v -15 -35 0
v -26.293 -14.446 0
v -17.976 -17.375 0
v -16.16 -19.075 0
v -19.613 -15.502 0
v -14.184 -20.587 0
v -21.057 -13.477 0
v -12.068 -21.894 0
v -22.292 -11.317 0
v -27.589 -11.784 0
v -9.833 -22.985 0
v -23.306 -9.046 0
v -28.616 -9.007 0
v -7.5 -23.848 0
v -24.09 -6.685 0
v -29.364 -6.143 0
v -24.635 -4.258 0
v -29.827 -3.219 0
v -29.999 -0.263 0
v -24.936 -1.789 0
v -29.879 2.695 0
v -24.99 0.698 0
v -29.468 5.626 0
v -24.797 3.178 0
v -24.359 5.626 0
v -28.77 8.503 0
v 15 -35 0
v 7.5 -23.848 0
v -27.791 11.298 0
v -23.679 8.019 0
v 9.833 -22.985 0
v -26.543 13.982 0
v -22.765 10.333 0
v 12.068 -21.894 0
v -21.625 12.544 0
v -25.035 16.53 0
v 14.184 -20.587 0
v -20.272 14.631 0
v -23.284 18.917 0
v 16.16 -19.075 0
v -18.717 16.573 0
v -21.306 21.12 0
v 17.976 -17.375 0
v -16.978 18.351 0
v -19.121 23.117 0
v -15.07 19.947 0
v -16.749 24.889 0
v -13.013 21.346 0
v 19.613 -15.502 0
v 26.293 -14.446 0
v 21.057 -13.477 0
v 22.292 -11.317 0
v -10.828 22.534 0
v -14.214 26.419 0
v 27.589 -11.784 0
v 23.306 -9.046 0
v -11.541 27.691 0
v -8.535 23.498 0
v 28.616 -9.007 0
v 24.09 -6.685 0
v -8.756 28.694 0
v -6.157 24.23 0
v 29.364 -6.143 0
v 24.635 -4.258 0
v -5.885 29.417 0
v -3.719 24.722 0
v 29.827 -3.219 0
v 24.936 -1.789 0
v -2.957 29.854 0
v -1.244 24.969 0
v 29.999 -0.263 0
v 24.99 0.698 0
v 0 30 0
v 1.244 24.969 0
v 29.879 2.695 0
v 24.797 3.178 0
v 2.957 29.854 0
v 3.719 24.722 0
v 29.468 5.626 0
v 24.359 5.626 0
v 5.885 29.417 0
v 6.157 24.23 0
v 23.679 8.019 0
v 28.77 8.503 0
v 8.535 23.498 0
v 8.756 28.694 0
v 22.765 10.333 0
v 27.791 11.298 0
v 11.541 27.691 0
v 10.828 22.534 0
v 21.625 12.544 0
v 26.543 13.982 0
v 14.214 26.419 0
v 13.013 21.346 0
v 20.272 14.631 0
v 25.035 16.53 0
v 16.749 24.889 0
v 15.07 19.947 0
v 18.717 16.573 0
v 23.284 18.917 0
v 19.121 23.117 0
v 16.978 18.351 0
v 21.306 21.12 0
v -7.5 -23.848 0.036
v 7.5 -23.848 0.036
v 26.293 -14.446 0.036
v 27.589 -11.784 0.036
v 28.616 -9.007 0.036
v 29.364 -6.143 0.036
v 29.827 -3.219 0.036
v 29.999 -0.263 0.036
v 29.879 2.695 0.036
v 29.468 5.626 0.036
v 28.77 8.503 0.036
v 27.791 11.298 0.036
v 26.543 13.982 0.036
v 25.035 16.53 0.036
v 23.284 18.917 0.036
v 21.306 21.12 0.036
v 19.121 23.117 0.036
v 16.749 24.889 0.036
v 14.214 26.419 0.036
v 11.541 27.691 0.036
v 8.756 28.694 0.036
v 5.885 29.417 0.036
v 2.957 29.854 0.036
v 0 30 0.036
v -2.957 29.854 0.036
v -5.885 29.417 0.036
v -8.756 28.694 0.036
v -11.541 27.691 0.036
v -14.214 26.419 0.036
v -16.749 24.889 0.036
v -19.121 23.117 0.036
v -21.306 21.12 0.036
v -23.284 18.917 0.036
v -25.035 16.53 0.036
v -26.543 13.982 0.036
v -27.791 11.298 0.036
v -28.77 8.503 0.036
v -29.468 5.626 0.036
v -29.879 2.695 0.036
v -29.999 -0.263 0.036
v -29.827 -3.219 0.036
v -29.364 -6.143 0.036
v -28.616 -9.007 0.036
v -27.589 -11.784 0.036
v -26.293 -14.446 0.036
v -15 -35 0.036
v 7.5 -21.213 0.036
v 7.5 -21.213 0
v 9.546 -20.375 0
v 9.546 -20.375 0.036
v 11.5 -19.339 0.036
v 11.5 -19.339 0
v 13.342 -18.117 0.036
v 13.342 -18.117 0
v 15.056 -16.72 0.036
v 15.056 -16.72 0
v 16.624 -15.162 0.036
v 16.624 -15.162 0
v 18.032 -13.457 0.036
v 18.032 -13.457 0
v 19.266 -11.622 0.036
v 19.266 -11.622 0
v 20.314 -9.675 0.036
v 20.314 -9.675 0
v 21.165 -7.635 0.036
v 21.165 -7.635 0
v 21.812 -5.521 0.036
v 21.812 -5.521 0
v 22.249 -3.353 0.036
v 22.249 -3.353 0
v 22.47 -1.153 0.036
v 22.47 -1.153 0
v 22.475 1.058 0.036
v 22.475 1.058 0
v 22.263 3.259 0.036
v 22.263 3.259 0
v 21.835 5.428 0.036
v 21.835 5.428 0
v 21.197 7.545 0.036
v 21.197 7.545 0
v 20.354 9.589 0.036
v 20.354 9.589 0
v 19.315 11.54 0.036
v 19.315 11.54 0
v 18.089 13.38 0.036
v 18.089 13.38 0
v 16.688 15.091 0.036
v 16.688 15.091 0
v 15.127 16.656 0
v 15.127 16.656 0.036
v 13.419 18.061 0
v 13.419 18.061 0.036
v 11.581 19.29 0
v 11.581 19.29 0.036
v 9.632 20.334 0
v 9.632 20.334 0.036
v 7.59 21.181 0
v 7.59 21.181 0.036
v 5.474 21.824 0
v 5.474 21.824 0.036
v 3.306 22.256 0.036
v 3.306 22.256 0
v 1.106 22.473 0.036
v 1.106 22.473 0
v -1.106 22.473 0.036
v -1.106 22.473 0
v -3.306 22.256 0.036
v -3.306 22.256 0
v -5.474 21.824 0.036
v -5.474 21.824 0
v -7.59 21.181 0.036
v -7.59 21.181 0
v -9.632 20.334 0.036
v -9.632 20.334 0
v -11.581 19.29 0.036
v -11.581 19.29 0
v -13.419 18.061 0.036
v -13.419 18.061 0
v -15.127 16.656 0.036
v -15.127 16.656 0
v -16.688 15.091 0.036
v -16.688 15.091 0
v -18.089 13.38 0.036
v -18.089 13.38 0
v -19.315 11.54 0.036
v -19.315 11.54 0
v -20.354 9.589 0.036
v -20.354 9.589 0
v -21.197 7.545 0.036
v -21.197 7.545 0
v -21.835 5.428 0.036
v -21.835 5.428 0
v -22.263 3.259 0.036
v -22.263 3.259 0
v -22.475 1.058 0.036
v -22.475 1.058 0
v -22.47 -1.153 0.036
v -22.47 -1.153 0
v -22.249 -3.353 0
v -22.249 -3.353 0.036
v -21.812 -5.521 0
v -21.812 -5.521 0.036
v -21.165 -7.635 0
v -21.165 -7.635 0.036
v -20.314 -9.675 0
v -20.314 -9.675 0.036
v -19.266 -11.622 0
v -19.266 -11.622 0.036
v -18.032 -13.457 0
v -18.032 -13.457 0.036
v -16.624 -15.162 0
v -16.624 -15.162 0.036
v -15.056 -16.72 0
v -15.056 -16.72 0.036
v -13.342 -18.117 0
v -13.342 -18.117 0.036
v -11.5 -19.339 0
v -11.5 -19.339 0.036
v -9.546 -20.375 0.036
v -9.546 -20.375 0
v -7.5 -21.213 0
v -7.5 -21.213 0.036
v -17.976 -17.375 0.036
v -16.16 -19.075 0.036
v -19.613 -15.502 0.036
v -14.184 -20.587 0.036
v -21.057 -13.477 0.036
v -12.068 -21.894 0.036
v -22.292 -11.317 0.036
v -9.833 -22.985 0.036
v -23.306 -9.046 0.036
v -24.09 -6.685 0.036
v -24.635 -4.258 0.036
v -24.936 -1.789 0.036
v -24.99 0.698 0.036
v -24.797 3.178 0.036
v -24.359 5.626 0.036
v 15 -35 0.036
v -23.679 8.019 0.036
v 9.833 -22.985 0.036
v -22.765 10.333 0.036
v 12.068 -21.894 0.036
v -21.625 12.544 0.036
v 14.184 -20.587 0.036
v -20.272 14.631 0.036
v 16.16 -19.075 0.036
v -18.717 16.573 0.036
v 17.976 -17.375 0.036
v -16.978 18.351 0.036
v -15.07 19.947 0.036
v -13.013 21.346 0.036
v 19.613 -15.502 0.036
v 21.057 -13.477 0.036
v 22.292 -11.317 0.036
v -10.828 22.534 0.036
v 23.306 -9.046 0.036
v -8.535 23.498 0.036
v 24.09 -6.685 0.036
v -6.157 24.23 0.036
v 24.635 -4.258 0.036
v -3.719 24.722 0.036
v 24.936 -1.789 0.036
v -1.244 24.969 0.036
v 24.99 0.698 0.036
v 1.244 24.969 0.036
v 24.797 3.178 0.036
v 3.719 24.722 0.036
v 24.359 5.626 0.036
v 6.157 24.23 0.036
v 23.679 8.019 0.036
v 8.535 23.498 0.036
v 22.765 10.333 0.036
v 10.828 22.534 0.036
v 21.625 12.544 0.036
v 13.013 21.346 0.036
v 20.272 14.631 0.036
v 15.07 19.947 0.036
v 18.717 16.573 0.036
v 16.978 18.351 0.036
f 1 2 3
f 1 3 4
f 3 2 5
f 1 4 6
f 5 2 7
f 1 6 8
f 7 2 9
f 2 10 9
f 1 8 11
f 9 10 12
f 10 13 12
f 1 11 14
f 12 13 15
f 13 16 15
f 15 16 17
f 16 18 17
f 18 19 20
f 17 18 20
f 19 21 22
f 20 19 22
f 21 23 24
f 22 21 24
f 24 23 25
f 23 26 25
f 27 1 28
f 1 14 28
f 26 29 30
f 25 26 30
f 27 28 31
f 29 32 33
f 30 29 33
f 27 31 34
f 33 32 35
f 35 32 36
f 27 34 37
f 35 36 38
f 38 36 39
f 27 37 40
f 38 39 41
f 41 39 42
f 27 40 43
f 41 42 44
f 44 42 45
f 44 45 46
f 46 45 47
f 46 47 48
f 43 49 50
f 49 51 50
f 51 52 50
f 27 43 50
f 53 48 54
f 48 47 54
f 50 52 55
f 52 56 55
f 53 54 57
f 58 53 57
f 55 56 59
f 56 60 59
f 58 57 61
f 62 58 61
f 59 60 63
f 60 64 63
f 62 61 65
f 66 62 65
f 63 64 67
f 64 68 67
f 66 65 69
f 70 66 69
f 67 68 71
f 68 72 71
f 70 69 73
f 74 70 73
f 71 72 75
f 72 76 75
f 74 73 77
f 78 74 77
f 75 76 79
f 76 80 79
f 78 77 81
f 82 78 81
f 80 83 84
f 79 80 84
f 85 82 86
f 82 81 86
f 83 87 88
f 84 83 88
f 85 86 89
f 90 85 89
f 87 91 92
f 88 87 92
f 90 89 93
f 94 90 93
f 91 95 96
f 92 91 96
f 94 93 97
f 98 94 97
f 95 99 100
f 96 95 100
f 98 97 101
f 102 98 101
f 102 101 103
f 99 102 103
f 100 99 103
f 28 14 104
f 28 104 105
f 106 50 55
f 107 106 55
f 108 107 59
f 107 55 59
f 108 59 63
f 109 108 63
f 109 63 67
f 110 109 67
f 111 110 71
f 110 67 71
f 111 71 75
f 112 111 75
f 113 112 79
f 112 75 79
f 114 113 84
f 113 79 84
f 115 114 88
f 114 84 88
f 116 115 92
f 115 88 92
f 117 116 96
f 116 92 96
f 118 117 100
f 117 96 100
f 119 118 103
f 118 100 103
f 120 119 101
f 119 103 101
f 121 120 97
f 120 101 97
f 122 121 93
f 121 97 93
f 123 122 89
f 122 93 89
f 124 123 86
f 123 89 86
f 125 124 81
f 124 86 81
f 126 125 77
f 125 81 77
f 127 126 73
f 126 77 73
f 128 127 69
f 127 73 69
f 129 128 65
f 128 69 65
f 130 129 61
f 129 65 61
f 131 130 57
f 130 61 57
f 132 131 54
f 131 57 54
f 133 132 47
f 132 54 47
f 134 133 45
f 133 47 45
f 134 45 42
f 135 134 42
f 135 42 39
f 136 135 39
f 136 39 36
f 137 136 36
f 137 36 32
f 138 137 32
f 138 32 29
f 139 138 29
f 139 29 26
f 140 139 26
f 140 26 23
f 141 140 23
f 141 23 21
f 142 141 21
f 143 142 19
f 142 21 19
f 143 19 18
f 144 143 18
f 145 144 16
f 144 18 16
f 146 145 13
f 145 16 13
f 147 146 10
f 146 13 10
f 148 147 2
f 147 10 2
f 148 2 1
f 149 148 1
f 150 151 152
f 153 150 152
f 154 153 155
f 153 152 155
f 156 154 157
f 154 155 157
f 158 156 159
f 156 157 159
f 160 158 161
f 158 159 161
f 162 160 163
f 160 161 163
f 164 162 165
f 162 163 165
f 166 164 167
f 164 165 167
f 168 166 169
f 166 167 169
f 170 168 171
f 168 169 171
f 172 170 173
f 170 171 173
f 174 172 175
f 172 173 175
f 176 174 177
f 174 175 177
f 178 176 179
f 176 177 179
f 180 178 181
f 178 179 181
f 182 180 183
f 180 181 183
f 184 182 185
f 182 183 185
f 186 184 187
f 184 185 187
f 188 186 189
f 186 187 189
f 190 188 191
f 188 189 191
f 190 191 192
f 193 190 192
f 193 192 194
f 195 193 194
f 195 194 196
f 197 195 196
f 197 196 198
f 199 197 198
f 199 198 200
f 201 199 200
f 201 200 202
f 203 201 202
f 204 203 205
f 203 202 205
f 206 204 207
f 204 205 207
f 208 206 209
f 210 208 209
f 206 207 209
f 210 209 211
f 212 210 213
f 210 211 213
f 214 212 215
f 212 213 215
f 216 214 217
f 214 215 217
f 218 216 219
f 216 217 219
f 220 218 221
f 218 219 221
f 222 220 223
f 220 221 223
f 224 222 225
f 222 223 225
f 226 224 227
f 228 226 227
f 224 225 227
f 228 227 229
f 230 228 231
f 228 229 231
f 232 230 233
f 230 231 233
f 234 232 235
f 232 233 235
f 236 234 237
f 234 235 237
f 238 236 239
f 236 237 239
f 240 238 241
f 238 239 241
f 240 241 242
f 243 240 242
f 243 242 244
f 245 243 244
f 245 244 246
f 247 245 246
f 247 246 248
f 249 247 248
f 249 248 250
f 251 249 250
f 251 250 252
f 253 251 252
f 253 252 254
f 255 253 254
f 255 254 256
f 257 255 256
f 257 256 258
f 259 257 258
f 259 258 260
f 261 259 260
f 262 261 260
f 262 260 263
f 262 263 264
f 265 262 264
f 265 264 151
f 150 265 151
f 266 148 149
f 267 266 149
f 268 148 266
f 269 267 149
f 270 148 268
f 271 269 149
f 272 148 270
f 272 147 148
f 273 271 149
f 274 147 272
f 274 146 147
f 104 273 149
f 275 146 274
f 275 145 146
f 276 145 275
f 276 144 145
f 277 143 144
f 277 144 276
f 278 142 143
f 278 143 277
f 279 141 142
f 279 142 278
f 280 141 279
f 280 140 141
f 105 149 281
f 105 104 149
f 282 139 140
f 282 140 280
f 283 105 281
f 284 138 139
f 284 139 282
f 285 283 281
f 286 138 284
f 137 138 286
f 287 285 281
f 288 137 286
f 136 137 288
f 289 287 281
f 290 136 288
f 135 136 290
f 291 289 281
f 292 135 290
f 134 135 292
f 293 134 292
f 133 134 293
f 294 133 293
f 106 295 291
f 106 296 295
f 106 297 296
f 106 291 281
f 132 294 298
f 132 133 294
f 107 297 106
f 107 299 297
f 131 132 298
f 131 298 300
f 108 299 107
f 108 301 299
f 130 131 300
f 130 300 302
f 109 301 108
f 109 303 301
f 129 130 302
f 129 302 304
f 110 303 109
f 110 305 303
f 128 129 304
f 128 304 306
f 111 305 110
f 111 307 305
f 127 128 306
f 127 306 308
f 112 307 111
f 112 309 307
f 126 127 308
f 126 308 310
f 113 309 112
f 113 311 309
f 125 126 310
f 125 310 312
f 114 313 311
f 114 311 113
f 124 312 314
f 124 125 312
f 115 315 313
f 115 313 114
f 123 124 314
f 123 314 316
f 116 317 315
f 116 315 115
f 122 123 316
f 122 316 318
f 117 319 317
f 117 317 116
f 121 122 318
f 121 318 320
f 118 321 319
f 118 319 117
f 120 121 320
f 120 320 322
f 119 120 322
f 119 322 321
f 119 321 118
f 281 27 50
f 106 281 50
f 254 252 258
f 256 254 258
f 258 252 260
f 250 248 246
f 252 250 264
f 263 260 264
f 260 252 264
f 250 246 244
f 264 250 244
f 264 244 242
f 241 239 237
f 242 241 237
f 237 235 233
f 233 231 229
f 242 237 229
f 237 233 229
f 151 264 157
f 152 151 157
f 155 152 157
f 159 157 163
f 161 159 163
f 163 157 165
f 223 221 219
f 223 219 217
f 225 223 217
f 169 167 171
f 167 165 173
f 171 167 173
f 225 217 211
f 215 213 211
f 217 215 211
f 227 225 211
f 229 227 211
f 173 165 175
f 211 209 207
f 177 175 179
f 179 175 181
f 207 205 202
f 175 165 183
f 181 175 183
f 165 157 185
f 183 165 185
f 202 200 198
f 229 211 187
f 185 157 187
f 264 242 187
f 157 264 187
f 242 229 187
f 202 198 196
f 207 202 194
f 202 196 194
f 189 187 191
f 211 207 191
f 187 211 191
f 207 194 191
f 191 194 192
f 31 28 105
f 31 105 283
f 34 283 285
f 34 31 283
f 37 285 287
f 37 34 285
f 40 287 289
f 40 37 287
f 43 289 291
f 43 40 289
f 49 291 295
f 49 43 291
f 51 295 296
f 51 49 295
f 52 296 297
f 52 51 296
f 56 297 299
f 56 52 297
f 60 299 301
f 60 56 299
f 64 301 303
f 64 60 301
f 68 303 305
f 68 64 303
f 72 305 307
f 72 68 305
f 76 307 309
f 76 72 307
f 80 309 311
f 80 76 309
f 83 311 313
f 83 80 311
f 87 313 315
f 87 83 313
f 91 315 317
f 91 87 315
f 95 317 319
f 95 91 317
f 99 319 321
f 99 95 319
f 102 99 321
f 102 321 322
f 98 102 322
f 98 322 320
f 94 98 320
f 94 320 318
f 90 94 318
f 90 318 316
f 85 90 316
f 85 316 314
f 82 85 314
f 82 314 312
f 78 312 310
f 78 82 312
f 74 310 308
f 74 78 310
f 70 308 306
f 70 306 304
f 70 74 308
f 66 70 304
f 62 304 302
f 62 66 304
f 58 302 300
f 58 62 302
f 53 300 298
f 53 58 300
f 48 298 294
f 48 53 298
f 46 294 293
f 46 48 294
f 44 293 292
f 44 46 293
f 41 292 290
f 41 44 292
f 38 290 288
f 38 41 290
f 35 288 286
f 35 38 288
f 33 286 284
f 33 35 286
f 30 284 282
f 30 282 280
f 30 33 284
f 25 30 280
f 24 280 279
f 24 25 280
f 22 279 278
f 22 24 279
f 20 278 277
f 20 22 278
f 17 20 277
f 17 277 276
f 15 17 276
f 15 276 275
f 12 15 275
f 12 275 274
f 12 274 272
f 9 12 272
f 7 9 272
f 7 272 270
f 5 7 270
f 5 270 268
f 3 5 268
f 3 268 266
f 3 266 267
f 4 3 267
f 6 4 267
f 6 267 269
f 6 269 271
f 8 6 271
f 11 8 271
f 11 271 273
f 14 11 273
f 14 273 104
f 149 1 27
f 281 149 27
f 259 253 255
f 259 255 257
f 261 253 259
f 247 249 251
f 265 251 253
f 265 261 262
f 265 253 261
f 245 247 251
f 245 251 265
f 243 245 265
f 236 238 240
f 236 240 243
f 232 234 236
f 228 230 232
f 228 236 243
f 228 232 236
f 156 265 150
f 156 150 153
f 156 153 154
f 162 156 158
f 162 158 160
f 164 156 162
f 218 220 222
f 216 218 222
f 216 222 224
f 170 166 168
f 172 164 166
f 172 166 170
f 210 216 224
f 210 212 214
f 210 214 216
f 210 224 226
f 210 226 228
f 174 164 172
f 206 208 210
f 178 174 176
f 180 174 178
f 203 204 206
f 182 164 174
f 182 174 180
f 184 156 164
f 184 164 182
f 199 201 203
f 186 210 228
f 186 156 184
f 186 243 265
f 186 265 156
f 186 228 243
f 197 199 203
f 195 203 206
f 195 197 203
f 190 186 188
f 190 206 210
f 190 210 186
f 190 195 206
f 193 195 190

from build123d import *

# Parameters (mm, degrees)
BOSS_EXTRUDE1_DEPTH   = 0.03556
BOSS_EXTRUDE1_2_DEPTH = 0.03556


with BuildPart() as part:
    # Sketch1 → Boss-Extrude1 (new body)
    with BuildSketch(Plane.XY):
        with BuildLine():
            Line((-7.500000004, -21.213203434), (7.500000004, -21.213203434))
            ThreePointArc((7.500000004, -21.213203434), (0, 22.5), (-7.500000004, -21.213203434))
        make_face()
    extrude(amount=BOSS_EXTRUDE1_DEPTH)


with BuildPart() as body_2:
    # Sketch1 → Boss-Extrude1 2 (new body)
    with BuildSketch(Plane.XY):
        with BuildLine():
            Line((-15, -35.000000034), (15, -35.000000034))
            Line((15, -35.000000034), (26.292884658, -14.445906561))
            ThreePointArc((26.292884658, -14.445906561), (0, 30), (-26.292884658, -14.445906561))
            Line((-26.292884658, -14.445906561), (-15, -35.000000034))
        make_face()
        with BuildLine():
            Line((-7.500000004, -23.848480034), (7.500000004, -23.848480034))
            ThreePointArc((7.500000004, -23.848480034), (0, 25), (-7.500000004, -23.848480034))
        make_face(mode=Mode.SUBTRACT)
    extrude(amount=BOSS_EXTRUDE1_2_DEPTH)


solid = Compound([part.part, body_2.part])
